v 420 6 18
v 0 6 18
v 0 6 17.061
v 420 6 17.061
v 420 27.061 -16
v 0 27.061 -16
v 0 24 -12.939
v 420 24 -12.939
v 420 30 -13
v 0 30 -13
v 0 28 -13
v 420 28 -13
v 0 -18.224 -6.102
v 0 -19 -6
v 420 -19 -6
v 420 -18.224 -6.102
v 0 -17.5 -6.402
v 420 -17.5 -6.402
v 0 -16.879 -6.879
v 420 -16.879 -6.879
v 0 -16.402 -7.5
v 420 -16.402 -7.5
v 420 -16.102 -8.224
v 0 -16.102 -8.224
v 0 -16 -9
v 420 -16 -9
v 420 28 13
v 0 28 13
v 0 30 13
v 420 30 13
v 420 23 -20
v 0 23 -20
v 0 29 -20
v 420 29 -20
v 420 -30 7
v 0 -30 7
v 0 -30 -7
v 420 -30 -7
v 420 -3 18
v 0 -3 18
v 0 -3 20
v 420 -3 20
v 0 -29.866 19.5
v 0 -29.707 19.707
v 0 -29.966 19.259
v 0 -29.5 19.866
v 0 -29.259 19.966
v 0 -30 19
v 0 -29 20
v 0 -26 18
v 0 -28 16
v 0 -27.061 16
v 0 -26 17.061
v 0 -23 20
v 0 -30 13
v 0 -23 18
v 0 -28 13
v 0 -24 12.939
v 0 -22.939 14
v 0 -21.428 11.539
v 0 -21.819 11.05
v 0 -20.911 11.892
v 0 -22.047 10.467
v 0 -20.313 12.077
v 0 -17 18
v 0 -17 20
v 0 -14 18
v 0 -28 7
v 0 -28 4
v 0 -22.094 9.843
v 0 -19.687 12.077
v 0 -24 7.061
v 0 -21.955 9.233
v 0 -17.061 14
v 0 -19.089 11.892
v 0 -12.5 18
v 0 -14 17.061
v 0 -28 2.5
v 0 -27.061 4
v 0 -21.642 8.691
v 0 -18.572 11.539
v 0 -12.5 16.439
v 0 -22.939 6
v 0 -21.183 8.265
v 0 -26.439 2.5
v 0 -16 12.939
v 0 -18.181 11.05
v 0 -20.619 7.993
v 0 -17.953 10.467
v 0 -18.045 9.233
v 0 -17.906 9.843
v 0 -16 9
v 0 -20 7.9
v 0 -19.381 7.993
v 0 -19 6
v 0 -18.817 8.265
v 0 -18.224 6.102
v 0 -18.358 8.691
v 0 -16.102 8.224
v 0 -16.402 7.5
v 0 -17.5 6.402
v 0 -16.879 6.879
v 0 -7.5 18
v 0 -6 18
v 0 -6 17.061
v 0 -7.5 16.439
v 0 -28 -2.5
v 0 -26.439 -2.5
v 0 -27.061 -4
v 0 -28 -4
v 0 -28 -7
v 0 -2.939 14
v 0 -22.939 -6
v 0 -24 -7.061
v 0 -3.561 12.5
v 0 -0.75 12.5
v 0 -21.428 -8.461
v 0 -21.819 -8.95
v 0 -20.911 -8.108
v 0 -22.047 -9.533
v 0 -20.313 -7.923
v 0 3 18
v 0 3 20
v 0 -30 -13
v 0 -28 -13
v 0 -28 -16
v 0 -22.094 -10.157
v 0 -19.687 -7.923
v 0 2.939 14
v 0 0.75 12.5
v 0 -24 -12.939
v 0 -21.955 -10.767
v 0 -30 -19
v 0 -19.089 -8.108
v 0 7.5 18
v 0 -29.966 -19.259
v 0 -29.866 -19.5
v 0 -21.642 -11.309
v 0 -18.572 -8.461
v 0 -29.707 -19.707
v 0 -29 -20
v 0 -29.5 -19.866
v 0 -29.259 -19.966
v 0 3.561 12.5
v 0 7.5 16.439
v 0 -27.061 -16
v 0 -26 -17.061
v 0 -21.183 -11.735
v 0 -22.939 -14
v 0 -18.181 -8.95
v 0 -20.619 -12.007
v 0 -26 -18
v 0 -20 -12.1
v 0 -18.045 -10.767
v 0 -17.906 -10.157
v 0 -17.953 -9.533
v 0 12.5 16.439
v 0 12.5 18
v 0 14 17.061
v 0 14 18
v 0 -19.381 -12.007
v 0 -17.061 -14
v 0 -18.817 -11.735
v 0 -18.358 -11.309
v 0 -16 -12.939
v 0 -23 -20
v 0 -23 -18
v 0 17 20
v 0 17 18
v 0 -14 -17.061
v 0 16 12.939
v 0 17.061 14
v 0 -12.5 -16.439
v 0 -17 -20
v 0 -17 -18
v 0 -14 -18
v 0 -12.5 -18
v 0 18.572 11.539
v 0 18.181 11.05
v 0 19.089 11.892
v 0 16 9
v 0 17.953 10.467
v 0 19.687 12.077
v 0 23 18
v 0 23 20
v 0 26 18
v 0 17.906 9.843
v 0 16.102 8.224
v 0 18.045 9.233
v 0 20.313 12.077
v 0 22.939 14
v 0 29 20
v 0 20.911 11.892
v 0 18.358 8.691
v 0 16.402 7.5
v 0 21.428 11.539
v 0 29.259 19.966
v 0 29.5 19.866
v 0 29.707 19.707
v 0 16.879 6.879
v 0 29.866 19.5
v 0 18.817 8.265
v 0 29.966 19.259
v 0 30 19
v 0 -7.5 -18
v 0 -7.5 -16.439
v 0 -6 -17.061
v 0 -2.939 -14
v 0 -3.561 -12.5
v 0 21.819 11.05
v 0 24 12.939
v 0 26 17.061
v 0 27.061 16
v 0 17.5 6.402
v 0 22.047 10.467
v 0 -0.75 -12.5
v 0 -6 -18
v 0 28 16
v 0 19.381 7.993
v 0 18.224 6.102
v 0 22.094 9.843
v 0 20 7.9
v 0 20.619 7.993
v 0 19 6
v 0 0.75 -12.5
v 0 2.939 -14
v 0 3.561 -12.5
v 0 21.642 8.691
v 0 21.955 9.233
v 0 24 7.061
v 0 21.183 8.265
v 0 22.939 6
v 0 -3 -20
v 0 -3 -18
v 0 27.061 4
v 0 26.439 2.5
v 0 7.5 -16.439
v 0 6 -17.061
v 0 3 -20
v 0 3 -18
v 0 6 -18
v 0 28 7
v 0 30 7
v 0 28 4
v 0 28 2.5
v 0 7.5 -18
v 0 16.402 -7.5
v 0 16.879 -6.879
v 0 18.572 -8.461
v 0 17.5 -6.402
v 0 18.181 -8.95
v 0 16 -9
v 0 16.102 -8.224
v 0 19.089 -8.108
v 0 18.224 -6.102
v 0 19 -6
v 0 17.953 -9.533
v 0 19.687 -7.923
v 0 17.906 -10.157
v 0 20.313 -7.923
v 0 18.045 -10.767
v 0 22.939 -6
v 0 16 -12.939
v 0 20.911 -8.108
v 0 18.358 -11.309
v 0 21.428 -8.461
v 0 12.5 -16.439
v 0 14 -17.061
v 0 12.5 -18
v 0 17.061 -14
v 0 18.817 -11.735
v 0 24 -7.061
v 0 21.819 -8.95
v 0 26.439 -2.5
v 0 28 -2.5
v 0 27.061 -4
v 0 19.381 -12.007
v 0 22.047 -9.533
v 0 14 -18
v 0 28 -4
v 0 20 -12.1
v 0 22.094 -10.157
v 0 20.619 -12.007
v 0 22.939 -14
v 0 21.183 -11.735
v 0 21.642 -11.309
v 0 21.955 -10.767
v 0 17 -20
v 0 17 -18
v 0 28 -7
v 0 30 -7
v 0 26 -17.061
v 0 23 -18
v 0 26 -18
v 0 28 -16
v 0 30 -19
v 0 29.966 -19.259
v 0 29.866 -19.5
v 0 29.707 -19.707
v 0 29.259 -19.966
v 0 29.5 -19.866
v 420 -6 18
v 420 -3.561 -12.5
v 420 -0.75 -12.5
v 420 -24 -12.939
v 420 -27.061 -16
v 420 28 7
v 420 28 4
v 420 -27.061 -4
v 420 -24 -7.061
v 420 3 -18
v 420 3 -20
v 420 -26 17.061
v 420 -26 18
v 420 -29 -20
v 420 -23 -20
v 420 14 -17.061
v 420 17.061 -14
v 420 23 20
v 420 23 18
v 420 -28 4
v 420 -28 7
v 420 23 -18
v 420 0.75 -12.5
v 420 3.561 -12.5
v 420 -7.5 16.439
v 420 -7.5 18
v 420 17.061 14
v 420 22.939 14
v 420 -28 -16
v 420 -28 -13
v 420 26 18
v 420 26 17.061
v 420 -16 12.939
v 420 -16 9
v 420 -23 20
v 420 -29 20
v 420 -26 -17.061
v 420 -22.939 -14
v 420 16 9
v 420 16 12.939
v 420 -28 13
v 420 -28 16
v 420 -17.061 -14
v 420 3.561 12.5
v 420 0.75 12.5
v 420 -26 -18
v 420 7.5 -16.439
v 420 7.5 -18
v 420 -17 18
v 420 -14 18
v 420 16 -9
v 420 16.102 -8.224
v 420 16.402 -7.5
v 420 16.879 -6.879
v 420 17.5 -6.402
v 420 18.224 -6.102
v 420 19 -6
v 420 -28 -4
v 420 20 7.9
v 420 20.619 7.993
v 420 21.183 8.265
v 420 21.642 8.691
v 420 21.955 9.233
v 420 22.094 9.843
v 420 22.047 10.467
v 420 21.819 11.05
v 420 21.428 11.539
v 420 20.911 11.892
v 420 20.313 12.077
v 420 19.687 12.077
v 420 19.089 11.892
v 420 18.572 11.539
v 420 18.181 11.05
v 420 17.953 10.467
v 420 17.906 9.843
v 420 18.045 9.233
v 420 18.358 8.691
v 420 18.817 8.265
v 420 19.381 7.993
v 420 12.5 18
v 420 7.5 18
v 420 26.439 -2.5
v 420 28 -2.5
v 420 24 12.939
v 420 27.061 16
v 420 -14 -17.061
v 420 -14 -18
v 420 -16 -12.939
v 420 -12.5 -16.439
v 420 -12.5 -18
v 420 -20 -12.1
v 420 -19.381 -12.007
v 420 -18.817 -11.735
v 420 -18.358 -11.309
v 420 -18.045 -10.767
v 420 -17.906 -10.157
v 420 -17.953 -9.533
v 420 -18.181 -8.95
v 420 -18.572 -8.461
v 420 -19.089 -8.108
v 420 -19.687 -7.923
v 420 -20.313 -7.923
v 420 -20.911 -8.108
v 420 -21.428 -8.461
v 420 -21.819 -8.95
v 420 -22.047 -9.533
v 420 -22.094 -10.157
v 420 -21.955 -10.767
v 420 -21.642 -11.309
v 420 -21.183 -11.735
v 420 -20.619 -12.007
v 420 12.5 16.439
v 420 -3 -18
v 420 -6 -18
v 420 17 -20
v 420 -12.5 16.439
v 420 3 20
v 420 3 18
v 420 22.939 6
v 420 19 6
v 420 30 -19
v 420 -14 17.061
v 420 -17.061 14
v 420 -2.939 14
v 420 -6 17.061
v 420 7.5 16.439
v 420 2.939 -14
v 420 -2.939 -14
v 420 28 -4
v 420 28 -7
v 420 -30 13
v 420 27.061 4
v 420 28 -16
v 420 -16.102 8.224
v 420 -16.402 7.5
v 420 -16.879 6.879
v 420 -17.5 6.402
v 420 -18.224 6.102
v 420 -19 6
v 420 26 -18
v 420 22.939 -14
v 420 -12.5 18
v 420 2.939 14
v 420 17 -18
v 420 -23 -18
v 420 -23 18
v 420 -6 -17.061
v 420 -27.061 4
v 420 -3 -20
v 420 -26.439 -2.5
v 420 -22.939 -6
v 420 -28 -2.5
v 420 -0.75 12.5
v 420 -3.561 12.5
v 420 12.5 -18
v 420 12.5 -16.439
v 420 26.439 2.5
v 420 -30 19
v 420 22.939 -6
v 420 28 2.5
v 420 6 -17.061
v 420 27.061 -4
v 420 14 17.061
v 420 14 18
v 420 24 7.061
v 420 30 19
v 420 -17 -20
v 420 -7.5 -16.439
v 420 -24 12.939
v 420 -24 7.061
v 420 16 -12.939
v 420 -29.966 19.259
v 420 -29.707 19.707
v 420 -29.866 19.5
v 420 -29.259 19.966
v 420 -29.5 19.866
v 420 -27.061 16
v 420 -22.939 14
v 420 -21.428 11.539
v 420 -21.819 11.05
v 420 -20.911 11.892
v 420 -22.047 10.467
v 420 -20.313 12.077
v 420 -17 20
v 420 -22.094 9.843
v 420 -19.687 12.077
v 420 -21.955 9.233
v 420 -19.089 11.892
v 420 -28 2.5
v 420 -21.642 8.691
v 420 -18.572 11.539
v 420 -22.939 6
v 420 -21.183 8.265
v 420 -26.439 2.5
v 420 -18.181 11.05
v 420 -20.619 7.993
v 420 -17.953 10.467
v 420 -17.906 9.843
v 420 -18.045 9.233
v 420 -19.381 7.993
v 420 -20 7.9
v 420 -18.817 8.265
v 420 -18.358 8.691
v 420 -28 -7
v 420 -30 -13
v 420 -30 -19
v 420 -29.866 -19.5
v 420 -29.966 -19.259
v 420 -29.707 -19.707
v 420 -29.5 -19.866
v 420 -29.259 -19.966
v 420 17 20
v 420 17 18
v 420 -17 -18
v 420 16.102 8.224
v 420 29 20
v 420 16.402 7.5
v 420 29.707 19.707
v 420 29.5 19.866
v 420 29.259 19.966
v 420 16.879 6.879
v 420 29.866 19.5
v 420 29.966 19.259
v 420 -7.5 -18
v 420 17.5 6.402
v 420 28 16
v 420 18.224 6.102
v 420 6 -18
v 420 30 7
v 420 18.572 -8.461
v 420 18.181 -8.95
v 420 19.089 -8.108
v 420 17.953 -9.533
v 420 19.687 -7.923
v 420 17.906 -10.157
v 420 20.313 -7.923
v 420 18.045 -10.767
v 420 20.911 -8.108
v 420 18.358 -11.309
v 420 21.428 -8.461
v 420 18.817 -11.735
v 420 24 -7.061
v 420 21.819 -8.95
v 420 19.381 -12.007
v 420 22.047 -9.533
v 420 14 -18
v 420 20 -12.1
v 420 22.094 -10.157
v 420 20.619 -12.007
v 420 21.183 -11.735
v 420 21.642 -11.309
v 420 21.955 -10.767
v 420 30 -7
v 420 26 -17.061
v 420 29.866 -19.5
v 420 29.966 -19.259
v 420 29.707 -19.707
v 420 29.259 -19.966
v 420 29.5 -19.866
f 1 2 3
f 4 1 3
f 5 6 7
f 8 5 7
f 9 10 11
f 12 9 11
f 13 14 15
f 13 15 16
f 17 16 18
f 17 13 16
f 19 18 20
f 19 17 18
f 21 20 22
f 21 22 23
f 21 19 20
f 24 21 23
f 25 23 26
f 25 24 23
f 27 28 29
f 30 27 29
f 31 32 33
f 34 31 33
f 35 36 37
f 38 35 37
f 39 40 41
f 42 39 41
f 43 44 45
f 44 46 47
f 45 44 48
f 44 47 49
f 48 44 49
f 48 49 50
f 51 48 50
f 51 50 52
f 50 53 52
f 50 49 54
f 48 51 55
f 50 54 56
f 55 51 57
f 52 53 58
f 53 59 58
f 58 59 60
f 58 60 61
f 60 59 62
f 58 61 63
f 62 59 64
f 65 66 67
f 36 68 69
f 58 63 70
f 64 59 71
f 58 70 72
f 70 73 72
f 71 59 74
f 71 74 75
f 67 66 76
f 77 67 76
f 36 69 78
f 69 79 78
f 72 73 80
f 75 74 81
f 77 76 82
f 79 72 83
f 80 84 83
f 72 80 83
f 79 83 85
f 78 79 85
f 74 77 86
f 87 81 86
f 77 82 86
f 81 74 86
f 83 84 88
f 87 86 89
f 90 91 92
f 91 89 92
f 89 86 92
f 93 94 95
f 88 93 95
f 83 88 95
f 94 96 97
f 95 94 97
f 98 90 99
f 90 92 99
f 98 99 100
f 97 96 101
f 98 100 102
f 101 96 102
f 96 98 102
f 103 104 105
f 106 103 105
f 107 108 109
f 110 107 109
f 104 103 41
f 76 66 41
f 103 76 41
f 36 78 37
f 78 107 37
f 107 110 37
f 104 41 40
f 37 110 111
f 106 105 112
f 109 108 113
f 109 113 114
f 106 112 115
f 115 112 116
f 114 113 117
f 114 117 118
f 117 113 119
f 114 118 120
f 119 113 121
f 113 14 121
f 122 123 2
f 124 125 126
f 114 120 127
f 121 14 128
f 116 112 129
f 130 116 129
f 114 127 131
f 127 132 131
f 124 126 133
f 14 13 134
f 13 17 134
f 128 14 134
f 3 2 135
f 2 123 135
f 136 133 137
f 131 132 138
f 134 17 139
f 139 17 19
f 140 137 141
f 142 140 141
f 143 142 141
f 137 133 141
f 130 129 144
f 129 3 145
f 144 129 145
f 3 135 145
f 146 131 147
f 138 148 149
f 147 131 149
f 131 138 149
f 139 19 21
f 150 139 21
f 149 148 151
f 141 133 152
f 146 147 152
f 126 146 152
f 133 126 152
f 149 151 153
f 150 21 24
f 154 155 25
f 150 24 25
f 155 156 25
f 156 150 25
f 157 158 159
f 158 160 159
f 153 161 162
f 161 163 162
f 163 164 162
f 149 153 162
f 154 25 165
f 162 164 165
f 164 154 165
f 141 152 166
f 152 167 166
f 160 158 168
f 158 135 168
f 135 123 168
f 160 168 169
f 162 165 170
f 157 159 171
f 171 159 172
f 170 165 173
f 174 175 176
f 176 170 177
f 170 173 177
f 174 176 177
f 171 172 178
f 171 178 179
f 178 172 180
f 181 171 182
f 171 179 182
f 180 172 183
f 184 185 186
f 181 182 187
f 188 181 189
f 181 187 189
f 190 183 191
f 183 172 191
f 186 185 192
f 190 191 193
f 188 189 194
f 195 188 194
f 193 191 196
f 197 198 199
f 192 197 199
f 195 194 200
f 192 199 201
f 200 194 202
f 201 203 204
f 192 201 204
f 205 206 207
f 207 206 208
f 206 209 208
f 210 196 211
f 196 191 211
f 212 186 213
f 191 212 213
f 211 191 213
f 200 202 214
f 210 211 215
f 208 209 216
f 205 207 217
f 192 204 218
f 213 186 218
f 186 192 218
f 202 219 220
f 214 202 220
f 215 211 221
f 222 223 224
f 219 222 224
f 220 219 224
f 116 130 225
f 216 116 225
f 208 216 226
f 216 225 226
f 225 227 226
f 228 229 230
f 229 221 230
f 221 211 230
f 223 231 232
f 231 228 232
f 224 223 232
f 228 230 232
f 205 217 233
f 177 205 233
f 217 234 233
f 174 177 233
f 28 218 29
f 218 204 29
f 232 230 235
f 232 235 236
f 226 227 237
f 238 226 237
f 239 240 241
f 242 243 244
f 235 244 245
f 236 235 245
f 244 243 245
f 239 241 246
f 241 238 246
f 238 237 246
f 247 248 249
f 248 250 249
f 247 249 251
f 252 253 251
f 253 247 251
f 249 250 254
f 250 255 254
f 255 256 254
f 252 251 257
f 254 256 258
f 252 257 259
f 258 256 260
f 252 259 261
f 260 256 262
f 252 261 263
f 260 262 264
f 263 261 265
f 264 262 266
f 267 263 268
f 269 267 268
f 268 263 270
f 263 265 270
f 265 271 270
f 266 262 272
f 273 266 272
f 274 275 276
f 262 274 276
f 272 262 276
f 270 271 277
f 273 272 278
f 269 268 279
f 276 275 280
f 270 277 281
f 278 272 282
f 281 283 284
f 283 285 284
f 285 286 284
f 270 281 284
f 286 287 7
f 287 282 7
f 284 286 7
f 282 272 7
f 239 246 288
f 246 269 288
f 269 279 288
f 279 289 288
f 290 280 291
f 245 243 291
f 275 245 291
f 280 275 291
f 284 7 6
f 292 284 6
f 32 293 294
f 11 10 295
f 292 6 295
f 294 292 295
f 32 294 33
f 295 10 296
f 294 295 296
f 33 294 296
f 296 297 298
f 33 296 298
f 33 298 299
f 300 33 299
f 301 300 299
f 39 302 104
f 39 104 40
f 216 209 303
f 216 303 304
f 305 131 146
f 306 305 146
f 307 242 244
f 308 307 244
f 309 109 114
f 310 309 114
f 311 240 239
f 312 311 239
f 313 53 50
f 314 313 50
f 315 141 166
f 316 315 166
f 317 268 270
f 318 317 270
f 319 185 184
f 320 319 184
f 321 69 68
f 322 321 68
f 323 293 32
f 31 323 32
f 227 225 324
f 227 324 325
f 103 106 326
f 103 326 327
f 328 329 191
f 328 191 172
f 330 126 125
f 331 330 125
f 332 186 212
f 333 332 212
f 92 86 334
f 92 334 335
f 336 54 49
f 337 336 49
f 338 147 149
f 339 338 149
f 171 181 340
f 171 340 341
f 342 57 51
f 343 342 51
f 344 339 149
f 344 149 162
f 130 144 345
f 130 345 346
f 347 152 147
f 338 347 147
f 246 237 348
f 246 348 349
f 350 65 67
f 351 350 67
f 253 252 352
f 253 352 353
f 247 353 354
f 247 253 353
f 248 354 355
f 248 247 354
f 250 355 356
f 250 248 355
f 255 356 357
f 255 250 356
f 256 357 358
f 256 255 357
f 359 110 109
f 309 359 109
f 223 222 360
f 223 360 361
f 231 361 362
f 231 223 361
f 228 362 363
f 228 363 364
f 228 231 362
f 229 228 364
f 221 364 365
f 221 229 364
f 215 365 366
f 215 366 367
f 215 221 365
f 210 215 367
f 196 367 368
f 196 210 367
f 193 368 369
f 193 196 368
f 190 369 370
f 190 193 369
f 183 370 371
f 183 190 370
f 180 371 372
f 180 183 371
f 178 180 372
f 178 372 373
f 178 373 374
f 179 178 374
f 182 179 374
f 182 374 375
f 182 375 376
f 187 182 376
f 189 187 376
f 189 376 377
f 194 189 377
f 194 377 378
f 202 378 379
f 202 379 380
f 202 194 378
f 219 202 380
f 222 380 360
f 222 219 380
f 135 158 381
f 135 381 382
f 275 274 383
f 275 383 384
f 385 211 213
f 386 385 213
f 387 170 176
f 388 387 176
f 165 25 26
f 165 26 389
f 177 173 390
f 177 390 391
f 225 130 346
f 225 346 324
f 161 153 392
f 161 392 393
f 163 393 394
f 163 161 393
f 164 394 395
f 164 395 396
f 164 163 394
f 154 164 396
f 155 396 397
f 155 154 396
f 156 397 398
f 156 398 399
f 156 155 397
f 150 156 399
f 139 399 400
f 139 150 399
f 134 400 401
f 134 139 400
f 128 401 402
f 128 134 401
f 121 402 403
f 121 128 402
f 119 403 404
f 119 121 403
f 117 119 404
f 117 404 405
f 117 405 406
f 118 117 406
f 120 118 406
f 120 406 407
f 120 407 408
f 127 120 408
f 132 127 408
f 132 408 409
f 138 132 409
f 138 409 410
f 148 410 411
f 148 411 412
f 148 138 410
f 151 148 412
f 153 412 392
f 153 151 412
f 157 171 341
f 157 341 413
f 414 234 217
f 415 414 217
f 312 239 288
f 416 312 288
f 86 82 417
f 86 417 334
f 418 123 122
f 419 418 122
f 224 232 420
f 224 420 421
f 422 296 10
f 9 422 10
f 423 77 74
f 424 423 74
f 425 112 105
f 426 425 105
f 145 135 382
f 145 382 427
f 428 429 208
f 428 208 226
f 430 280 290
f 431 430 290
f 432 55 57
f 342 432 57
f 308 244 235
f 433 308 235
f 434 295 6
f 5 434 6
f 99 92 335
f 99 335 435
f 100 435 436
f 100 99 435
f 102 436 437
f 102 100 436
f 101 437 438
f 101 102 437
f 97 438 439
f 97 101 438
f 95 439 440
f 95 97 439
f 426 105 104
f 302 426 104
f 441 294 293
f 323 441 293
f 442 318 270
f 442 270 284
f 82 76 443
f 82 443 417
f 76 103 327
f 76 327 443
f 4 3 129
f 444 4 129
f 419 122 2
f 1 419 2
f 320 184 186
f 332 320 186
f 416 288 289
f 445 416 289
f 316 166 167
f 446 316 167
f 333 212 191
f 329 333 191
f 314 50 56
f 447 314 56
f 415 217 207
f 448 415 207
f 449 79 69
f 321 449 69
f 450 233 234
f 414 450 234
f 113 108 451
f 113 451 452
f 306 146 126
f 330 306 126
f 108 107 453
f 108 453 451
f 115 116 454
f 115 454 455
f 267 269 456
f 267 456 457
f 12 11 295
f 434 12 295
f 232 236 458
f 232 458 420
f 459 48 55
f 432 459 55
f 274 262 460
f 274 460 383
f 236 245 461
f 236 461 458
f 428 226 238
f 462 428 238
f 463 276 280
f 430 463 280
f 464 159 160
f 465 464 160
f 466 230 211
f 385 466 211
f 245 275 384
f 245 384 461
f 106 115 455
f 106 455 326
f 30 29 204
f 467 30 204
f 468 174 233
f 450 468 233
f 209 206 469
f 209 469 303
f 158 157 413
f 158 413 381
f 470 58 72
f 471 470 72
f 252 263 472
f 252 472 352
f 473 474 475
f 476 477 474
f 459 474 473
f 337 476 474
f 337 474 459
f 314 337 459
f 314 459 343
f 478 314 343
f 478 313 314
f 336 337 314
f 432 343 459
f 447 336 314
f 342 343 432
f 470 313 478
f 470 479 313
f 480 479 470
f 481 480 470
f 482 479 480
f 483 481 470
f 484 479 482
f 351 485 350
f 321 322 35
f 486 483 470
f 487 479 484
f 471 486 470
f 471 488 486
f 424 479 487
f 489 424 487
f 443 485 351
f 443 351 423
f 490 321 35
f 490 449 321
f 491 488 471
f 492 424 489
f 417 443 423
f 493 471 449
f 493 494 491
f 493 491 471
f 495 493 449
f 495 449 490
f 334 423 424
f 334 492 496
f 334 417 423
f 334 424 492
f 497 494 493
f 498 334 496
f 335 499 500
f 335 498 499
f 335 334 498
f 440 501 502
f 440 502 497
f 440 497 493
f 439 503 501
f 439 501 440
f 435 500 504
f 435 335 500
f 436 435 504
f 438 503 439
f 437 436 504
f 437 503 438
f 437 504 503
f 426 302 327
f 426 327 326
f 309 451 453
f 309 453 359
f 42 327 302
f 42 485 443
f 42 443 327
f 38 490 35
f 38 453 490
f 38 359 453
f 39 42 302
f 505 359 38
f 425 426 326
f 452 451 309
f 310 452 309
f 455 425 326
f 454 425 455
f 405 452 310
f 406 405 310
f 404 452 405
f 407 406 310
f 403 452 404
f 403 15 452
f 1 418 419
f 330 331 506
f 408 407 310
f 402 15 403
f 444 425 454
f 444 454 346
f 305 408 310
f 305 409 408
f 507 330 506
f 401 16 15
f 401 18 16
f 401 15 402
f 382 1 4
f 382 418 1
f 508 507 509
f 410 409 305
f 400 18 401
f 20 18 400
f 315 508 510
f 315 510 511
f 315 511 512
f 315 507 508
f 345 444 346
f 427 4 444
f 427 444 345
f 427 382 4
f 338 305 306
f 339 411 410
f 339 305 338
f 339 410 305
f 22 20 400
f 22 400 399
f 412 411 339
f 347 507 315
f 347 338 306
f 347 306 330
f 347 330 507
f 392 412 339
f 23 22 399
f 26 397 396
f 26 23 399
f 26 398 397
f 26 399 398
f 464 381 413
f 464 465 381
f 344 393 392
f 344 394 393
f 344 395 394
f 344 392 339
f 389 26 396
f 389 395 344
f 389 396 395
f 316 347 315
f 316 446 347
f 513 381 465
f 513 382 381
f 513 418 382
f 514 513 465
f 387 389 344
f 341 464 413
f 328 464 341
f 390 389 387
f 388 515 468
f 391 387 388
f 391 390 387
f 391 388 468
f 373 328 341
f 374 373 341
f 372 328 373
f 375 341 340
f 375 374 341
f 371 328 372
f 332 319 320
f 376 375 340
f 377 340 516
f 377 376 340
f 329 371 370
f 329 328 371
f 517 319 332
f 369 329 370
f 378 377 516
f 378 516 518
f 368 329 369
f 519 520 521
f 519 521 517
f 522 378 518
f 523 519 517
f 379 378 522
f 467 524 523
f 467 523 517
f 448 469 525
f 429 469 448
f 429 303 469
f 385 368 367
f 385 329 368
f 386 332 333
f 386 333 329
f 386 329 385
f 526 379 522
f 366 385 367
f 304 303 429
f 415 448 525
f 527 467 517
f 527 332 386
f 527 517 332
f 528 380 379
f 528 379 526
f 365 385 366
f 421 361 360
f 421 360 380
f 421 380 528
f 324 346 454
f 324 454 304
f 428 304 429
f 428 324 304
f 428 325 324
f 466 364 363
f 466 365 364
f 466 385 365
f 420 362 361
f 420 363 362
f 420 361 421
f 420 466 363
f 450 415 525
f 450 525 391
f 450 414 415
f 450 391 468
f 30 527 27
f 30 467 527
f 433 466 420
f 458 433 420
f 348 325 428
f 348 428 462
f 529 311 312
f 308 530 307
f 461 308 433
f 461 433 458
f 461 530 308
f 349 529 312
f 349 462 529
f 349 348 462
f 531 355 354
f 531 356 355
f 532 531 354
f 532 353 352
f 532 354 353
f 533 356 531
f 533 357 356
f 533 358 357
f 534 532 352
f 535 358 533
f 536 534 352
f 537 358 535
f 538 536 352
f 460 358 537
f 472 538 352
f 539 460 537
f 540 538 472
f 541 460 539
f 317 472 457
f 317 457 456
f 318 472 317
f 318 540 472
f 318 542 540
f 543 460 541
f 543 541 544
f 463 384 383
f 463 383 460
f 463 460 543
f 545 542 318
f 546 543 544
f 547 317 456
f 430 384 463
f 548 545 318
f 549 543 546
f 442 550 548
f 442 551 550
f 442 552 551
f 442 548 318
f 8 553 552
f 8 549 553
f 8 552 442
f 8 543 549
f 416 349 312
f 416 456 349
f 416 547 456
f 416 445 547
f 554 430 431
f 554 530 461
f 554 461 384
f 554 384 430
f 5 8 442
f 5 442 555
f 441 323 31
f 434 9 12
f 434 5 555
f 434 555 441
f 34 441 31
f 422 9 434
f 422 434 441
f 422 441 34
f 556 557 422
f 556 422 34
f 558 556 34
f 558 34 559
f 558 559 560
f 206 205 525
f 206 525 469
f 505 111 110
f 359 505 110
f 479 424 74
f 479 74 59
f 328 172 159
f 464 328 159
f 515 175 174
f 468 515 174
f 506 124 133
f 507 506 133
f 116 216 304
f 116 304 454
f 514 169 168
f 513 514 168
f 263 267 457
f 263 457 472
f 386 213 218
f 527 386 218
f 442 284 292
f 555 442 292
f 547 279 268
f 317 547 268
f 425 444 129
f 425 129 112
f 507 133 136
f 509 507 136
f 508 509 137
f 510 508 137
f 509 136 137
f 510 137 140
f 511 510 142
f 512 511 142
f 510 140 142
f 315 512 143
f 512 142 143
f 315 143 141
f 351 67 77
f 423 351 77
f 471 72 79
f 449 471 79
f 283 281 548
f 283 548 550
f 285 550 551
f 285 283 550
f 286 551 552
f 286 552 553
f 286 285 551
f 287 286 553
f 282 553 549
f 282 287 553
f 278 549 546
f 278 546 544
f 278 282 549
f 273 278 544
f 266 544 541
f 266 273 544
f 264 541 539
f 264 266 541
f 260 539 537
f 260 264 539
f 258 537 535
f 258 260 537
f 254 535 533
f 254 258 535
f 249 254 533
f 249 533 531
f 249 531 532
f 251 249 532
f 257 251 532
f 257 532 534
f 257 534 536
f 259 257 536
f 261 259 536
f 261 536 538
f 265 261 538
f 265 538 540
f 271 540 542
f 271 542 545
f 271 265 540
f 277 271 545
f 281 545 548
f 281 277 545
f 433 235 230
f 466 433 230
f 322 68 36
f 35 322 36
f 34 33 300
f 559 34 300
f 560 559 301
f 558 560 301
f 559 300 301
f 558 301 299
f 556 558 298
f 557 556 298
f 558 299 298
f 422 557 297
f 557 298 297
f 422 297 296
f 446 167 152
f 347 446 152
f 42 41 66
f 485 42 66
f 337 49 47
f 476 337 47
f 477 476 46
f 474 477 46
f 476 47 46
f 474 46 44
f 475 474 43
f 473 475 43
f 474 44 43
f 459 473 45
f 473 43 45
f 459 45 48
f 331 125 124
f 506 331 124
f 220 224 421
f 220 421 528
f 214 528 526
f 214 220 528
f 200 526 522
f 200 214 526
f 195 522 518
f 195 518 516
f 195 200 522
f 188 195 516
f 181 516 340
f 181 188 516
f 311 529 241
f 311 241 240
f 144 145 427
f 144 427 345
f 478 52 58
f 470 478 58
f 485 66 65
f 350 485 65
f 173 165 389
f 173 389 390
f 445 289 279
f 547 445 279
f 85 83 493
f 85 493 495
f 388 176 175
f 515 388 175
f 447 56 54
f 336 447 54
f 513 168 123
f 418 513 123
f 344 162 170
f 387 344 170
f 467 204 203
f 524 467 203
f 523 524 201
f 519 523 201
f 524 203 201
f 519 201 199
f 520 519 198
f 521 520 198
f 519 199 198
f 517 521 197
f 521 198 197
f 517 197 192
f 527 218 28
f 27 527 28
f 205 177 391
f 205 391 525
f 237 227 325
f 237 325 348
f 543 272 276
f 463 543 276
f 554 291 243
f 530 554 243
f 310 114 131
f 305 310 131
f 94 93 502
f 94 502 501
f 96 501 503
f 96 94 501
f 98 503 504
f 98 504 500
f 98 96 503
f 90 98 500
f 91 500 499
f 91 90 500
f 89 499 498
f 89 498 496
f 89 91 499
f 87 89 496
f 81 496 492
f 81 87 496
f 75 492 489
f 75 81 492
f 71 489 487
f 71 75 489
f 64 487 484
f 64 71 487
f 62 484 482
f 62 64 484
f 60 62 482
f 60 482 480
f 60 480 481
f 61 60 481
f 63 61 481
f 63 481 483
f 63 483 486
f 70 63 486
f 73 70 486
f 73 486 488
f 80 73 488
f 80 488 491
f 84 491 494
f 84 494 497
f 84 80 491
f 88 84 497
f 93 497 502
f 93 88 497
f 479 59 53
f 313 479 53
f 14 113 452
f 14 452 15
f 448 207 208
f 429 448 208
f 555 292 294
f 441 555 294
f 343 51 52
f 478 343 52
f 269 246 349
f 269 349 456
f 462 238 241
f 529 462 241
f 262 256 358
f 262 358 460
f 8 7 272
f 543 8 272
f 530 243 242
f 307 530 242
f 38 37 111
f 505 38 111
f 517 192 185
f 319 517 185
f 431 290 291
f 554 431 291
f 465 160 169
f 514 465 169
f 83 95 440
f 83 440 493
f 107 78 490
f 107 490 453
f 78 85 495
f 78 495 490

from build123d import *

# Parameters (mm, degrees)
SKETCH1_R           = 2.1
BOSS_EXTRUDE1_DEPTH = 420


with BuildPart() as part:
    # Sketch1 → Boss-Extrude1 (new body)
    with BuildSketch(Plane(origin=(0, 0, 0), x_dir=(0, 0, -1), z_dir=(1, 0, 0))):
        with BuildLine():
            Line((-20, 29), (-20, 23))
            Line((-20, 23), (-18, 23))
            Line((-18, 23), (-18, 26))
            Line((-18, 26), (-17.060660172, 26))
            Line((-17.060660172, 26), (-14, 22.939339828))
            Line((-14, 22.939339828), (-14, 17.060660172))
            Line((-14, 17.060660172), (-17.060660172, 14))
            Line((-17.060660172, 14), (-18, 14))
            Line((-18, 14), (-18, 17))
            Line((-18, 17), (-20, 17))
            Line((-20, 17), (-20, 3))
            Line((-20, 3), (-18, 3))
            Line((-18, 3), (-18, 6))
            Line((-18, 6), (-17.060660172, 6))
            Line((-17.060660172, 6), (-14, 2.939339828))
            Line((-14, 2.939339828), (-14, -2.939339828))
            Line((-14, -2.939339828), (-17.060660172, -6))
            Line((-17.060660172, -6), (-18, -6))
            Line((-18, -6), (-18, -3))
            Line((-18, -3), (-20, -3))
            Line((-20, -3), (-20, -17))
            Line((-20, -17), (-18, -17))
            Line((-18, -17), (-18, -14))
            Line((-18, -14), (-17.060660172, -14))
            Line((-17.060660172, -14), (-14, -17.060660172))
            Line((-14, -17.060660172), (-14, -22.939339828))
            Line((-14, -22.939339828), (-17.060660172, -26))
            Line((-17.060660172, -26), (-18, -26))
            Line((-18, -26), (-18, -23))
            Line((-18, -23), (-20, -23))
            Line((-20, -23), (-20, -29))
            ThreePointArc((-20, -29), (-19.707106781, -29.707106781), (-19, -30))
            Line((-19, -30), (-13, -30))
            Line((-13, -30), (-13, -28))
            Line((-13, -28), (-16, -28))
            Line((-16, -28), (-16, -27.060660172))
            Line((-16, -27.060660172), (-12.939339828, -24))
            Line((-12.939339828, -24), (-7.060660172, -24))
            Line((-7.060660172, -24), (-4, -27.060660172))
            Line((-4, -27.060660172), (-4, -28))
            Line((-4, -28), (-7, -28))
            Line((-7, -28), (-7, -30))
            Line((-7, -30), (7, -30))
            Line((7, -30), (7, -28))
            Line((7, -28), (4, -28))
            Line((4, -28), (4, -27.060660172))
            Line((4, -27.060660172), (7.060660172, -24))
            Line((7.060660172, -24), (12.939339828, -24))
            Line((12.939339828, -24), (16, -27.060660172))
            Line((16, -27.060660172), (16, -28))
            Line((16, -28), (13, -28))
            Line((13, -28), (13, -30))
            Line((13, -30), (19, -30))
            ThreePointArc((19, -30), (19.707106781, -29.707106781), (20, -29))
            Line((20, -29), (20, -23))
            Line((20, -23), (18, -23))
            Line((18, -23), (18, -26))
            Line((18, -26), (17.060660172, -26))
            Line((17.060660172, -26), (14, -22.939339828))
            Line((14, -22.939339828), (14, -17.060660172))
            Line((14, -17.060660172), (17.060660172, -14))
            Line((17.060660172, -14), (18, -14))
            Line((18, -14), (18, -17))
            Line((18, -17), (20, -17))
            Line((20, -17), (20, -3))
            Line((20, -3), (18, -3))
            Line((18, -3), (18, -6))
            Line((18, -6), (17.060660172, -6))
            Line((17.060660172, -6), (14, -2.939339828))
            Line((14, -2.939339828), (14, 2.939339828))
            Line((14, 2.939339828), (17.060660172, 6))
            Line((17.060660172, 6), (18, 6))
            Line((18, 6), (18, 3))
            Line((18, 3), (20, 3))
            Line((20, 3), (20, 17))
            Line((20, 17), (18, 17))
            Line((18, 17), (18, 14))
            Line((18, 14), (17.060660172, 14))
            Line((17.060660172, 14), (14, 17.060660172))
            Line((14, 17.060660172), (14, 22.939339828))
            Line((14, 22.939339828), (17.060660172, 26))
            Line((17.060660172, 26), (18, 26))
            Line((18, 26), (18, 23))
            Line((18, 23), (20, 23))
            Line((20, 23), (20, 29))
            ThreePointArc((20, 29), (19.707106781, 29.707106781), (19, 30))
            Line((19, 30), (13, 30))
            Line((13, 30), (13, 28))
            Line((13, 28), (16, 28))
            Line((16, 28), (16, 27.060660172))
            Line((16, 27.060660172), (12.939339828, 24))
            Line((12.939339828, 24), (7.060660172, 24))
            Line((7.060660172, 24), (4, 27.060660172))
            Line((4, 27.060660172), (4, 28))
            Line((4, 28), (7, 28))
            Line((7, 28), (7, 30))
            Line((7, 30), (-7, 30))
            Line((-7, 30), (-7, 28))
            Line((-7, 28), (-4, 28))
            Line((-4, 28), (-4, 27.060660172))
            Line((-4, 27.060660172), (-7.060660172, 24))
            Line((-7.060660172, 24), (-12.939339828, 24))
            Line((-12.939339828, 24), (-16, 27.060660172))
            Line((-16, 27.060660172), (-16, 28))
            Line((-16, 28), (-13, 28))
            Line((-13, 28), (-13, 30))
            Line((-13, 30), (-19, 30))
            ThreePointArc((-19, 30), (-19.707106781, 29.707106781), (-20, 29))
        make_face()
        with Locations((-10, 20)):
            Circle(SKETCH1_R, mode=Mode.SUBTRACT)
        with Locations((10, 20)):
            Circle(SKETCH1_R, mode=Mode.SUBTRACT)
        with Locations((10, -20)):
            Circle(SKETCH1_R, mode=Mode.SUBTRACT)
        with Locations((-10, -20)):
            Circle(SKETCH1_R, mode=Mode.SUBTRACT)
        with BuildLine():
            Line((-16.439339828, 12.5), (-18, 12.5))
            Line((-18, 12.5), (-18, 7.5))
            Line((-18, 7.5), (-16.439339828, 7.5))
            Line((-16.439339828, 7.5), (-12.5, 3.560660172))
            Line((-12.5, 3.560660172), (-12.5, 0.75))
            Line((-12.5, 0.75), (12.5, 0.75))
            Line((12.5, 0.75), (12.5, 3.560660172))
            Line((12.5, 3.560660172), (16.439339828, 7.5))
            Line((16.439339828, 7.5), (18, 7.5))
            Line((18, 7.5), (18, 12.5))
            Line((18, 12.5), (16.439339828, 12.5))
            Line((16.439339828, 12.5), (12.939339828, 16))
            Line((12.939339828, 16), (9, 16))
            ThreePointArc((9, 16), (6.878679656, 16.878679656), (6, 19))
            Line((6, 19), (6, 22.939339828))
            Line((6, 22.939339828), (2.5, 26.439339828))
            Line((2.5, 26.439339828), (2.5, 28))
            Line((2.5, 28), (-2.5, 28))
            Line((-2.5, 28), (-2.5, 26.439339828))
            Line((-2.5, 26.439339828), (-6, 22.939339828))
            Line((-6, 22.939339828), (-6, 19))
            ThreePointArc((-6, 19), (-6.878679656, 16.878679656), (-9, 16))
            Line((-9, 16), (-12.939339828, 16))
            Line((-12.939339828, 16), (-16.439339828, 12.5))
        make_face(mode=Mode.SUBTRACT)
        with BuildLine():
            Line((-18, -7.5), (-18, -12.5))
            Line((-18, -12.5), (-16.439339828, -12.5))
            Line((-16.439339828, -12.5), (-12.939339828, -16))
            Line((-12.939339828, -16), (-9, -16))
            ThreePointArc((-9, -16), (-6.878679656, -16.878679656), (-6, -19))
            Line((-6, -19), (-6, -22.939339828))
            Line((-6, -22.939339828), (-2.5, -26.439339828))
            Line((-2.5, -26.439339828), (-2.5, -28))
            Line((-2.5, -28), (2.5, -28))
            Line((2.5, -28), (2.5, -26.439339828))
            Line((2.5, -26.439339828), (6, -22.939339828))
            Line((6, -22.939339828), (6, -19))
            ThreePointArc((6, -19), (6.878679656, -16.878679656), (9, -16))
            Line((9, -16), (12.939339828, -16))
            Line((12.939339828, -16), (16.439339828, -12.5))
            Line((16.439339828, -12.5), (18, -12.5))
            Line((18, -12.5), (18, -7.5))
            Line((18, -7.5), (16.439339828, -7.5))
            Line((16.439339828, -7.5), (12.5, -3.560660172))
            Line((12.5, -3.560660172), (12.5, -0.75))
            Line((12.5, -0.75), (-12.5, -0.75))
            Line((-12.5, -0.75), (-12.5, -3.560660172))
            Line((-12.5, -3.560660172), (-16.439339828, -7.5))
            Line((-16.439339828, -7.5), (-18, -7.5))
        make_face(mode=Mode.SUBTRACT)
    extrude(amount=BOSS_EXTRUDE1_DEPTH)


solid = part.part
